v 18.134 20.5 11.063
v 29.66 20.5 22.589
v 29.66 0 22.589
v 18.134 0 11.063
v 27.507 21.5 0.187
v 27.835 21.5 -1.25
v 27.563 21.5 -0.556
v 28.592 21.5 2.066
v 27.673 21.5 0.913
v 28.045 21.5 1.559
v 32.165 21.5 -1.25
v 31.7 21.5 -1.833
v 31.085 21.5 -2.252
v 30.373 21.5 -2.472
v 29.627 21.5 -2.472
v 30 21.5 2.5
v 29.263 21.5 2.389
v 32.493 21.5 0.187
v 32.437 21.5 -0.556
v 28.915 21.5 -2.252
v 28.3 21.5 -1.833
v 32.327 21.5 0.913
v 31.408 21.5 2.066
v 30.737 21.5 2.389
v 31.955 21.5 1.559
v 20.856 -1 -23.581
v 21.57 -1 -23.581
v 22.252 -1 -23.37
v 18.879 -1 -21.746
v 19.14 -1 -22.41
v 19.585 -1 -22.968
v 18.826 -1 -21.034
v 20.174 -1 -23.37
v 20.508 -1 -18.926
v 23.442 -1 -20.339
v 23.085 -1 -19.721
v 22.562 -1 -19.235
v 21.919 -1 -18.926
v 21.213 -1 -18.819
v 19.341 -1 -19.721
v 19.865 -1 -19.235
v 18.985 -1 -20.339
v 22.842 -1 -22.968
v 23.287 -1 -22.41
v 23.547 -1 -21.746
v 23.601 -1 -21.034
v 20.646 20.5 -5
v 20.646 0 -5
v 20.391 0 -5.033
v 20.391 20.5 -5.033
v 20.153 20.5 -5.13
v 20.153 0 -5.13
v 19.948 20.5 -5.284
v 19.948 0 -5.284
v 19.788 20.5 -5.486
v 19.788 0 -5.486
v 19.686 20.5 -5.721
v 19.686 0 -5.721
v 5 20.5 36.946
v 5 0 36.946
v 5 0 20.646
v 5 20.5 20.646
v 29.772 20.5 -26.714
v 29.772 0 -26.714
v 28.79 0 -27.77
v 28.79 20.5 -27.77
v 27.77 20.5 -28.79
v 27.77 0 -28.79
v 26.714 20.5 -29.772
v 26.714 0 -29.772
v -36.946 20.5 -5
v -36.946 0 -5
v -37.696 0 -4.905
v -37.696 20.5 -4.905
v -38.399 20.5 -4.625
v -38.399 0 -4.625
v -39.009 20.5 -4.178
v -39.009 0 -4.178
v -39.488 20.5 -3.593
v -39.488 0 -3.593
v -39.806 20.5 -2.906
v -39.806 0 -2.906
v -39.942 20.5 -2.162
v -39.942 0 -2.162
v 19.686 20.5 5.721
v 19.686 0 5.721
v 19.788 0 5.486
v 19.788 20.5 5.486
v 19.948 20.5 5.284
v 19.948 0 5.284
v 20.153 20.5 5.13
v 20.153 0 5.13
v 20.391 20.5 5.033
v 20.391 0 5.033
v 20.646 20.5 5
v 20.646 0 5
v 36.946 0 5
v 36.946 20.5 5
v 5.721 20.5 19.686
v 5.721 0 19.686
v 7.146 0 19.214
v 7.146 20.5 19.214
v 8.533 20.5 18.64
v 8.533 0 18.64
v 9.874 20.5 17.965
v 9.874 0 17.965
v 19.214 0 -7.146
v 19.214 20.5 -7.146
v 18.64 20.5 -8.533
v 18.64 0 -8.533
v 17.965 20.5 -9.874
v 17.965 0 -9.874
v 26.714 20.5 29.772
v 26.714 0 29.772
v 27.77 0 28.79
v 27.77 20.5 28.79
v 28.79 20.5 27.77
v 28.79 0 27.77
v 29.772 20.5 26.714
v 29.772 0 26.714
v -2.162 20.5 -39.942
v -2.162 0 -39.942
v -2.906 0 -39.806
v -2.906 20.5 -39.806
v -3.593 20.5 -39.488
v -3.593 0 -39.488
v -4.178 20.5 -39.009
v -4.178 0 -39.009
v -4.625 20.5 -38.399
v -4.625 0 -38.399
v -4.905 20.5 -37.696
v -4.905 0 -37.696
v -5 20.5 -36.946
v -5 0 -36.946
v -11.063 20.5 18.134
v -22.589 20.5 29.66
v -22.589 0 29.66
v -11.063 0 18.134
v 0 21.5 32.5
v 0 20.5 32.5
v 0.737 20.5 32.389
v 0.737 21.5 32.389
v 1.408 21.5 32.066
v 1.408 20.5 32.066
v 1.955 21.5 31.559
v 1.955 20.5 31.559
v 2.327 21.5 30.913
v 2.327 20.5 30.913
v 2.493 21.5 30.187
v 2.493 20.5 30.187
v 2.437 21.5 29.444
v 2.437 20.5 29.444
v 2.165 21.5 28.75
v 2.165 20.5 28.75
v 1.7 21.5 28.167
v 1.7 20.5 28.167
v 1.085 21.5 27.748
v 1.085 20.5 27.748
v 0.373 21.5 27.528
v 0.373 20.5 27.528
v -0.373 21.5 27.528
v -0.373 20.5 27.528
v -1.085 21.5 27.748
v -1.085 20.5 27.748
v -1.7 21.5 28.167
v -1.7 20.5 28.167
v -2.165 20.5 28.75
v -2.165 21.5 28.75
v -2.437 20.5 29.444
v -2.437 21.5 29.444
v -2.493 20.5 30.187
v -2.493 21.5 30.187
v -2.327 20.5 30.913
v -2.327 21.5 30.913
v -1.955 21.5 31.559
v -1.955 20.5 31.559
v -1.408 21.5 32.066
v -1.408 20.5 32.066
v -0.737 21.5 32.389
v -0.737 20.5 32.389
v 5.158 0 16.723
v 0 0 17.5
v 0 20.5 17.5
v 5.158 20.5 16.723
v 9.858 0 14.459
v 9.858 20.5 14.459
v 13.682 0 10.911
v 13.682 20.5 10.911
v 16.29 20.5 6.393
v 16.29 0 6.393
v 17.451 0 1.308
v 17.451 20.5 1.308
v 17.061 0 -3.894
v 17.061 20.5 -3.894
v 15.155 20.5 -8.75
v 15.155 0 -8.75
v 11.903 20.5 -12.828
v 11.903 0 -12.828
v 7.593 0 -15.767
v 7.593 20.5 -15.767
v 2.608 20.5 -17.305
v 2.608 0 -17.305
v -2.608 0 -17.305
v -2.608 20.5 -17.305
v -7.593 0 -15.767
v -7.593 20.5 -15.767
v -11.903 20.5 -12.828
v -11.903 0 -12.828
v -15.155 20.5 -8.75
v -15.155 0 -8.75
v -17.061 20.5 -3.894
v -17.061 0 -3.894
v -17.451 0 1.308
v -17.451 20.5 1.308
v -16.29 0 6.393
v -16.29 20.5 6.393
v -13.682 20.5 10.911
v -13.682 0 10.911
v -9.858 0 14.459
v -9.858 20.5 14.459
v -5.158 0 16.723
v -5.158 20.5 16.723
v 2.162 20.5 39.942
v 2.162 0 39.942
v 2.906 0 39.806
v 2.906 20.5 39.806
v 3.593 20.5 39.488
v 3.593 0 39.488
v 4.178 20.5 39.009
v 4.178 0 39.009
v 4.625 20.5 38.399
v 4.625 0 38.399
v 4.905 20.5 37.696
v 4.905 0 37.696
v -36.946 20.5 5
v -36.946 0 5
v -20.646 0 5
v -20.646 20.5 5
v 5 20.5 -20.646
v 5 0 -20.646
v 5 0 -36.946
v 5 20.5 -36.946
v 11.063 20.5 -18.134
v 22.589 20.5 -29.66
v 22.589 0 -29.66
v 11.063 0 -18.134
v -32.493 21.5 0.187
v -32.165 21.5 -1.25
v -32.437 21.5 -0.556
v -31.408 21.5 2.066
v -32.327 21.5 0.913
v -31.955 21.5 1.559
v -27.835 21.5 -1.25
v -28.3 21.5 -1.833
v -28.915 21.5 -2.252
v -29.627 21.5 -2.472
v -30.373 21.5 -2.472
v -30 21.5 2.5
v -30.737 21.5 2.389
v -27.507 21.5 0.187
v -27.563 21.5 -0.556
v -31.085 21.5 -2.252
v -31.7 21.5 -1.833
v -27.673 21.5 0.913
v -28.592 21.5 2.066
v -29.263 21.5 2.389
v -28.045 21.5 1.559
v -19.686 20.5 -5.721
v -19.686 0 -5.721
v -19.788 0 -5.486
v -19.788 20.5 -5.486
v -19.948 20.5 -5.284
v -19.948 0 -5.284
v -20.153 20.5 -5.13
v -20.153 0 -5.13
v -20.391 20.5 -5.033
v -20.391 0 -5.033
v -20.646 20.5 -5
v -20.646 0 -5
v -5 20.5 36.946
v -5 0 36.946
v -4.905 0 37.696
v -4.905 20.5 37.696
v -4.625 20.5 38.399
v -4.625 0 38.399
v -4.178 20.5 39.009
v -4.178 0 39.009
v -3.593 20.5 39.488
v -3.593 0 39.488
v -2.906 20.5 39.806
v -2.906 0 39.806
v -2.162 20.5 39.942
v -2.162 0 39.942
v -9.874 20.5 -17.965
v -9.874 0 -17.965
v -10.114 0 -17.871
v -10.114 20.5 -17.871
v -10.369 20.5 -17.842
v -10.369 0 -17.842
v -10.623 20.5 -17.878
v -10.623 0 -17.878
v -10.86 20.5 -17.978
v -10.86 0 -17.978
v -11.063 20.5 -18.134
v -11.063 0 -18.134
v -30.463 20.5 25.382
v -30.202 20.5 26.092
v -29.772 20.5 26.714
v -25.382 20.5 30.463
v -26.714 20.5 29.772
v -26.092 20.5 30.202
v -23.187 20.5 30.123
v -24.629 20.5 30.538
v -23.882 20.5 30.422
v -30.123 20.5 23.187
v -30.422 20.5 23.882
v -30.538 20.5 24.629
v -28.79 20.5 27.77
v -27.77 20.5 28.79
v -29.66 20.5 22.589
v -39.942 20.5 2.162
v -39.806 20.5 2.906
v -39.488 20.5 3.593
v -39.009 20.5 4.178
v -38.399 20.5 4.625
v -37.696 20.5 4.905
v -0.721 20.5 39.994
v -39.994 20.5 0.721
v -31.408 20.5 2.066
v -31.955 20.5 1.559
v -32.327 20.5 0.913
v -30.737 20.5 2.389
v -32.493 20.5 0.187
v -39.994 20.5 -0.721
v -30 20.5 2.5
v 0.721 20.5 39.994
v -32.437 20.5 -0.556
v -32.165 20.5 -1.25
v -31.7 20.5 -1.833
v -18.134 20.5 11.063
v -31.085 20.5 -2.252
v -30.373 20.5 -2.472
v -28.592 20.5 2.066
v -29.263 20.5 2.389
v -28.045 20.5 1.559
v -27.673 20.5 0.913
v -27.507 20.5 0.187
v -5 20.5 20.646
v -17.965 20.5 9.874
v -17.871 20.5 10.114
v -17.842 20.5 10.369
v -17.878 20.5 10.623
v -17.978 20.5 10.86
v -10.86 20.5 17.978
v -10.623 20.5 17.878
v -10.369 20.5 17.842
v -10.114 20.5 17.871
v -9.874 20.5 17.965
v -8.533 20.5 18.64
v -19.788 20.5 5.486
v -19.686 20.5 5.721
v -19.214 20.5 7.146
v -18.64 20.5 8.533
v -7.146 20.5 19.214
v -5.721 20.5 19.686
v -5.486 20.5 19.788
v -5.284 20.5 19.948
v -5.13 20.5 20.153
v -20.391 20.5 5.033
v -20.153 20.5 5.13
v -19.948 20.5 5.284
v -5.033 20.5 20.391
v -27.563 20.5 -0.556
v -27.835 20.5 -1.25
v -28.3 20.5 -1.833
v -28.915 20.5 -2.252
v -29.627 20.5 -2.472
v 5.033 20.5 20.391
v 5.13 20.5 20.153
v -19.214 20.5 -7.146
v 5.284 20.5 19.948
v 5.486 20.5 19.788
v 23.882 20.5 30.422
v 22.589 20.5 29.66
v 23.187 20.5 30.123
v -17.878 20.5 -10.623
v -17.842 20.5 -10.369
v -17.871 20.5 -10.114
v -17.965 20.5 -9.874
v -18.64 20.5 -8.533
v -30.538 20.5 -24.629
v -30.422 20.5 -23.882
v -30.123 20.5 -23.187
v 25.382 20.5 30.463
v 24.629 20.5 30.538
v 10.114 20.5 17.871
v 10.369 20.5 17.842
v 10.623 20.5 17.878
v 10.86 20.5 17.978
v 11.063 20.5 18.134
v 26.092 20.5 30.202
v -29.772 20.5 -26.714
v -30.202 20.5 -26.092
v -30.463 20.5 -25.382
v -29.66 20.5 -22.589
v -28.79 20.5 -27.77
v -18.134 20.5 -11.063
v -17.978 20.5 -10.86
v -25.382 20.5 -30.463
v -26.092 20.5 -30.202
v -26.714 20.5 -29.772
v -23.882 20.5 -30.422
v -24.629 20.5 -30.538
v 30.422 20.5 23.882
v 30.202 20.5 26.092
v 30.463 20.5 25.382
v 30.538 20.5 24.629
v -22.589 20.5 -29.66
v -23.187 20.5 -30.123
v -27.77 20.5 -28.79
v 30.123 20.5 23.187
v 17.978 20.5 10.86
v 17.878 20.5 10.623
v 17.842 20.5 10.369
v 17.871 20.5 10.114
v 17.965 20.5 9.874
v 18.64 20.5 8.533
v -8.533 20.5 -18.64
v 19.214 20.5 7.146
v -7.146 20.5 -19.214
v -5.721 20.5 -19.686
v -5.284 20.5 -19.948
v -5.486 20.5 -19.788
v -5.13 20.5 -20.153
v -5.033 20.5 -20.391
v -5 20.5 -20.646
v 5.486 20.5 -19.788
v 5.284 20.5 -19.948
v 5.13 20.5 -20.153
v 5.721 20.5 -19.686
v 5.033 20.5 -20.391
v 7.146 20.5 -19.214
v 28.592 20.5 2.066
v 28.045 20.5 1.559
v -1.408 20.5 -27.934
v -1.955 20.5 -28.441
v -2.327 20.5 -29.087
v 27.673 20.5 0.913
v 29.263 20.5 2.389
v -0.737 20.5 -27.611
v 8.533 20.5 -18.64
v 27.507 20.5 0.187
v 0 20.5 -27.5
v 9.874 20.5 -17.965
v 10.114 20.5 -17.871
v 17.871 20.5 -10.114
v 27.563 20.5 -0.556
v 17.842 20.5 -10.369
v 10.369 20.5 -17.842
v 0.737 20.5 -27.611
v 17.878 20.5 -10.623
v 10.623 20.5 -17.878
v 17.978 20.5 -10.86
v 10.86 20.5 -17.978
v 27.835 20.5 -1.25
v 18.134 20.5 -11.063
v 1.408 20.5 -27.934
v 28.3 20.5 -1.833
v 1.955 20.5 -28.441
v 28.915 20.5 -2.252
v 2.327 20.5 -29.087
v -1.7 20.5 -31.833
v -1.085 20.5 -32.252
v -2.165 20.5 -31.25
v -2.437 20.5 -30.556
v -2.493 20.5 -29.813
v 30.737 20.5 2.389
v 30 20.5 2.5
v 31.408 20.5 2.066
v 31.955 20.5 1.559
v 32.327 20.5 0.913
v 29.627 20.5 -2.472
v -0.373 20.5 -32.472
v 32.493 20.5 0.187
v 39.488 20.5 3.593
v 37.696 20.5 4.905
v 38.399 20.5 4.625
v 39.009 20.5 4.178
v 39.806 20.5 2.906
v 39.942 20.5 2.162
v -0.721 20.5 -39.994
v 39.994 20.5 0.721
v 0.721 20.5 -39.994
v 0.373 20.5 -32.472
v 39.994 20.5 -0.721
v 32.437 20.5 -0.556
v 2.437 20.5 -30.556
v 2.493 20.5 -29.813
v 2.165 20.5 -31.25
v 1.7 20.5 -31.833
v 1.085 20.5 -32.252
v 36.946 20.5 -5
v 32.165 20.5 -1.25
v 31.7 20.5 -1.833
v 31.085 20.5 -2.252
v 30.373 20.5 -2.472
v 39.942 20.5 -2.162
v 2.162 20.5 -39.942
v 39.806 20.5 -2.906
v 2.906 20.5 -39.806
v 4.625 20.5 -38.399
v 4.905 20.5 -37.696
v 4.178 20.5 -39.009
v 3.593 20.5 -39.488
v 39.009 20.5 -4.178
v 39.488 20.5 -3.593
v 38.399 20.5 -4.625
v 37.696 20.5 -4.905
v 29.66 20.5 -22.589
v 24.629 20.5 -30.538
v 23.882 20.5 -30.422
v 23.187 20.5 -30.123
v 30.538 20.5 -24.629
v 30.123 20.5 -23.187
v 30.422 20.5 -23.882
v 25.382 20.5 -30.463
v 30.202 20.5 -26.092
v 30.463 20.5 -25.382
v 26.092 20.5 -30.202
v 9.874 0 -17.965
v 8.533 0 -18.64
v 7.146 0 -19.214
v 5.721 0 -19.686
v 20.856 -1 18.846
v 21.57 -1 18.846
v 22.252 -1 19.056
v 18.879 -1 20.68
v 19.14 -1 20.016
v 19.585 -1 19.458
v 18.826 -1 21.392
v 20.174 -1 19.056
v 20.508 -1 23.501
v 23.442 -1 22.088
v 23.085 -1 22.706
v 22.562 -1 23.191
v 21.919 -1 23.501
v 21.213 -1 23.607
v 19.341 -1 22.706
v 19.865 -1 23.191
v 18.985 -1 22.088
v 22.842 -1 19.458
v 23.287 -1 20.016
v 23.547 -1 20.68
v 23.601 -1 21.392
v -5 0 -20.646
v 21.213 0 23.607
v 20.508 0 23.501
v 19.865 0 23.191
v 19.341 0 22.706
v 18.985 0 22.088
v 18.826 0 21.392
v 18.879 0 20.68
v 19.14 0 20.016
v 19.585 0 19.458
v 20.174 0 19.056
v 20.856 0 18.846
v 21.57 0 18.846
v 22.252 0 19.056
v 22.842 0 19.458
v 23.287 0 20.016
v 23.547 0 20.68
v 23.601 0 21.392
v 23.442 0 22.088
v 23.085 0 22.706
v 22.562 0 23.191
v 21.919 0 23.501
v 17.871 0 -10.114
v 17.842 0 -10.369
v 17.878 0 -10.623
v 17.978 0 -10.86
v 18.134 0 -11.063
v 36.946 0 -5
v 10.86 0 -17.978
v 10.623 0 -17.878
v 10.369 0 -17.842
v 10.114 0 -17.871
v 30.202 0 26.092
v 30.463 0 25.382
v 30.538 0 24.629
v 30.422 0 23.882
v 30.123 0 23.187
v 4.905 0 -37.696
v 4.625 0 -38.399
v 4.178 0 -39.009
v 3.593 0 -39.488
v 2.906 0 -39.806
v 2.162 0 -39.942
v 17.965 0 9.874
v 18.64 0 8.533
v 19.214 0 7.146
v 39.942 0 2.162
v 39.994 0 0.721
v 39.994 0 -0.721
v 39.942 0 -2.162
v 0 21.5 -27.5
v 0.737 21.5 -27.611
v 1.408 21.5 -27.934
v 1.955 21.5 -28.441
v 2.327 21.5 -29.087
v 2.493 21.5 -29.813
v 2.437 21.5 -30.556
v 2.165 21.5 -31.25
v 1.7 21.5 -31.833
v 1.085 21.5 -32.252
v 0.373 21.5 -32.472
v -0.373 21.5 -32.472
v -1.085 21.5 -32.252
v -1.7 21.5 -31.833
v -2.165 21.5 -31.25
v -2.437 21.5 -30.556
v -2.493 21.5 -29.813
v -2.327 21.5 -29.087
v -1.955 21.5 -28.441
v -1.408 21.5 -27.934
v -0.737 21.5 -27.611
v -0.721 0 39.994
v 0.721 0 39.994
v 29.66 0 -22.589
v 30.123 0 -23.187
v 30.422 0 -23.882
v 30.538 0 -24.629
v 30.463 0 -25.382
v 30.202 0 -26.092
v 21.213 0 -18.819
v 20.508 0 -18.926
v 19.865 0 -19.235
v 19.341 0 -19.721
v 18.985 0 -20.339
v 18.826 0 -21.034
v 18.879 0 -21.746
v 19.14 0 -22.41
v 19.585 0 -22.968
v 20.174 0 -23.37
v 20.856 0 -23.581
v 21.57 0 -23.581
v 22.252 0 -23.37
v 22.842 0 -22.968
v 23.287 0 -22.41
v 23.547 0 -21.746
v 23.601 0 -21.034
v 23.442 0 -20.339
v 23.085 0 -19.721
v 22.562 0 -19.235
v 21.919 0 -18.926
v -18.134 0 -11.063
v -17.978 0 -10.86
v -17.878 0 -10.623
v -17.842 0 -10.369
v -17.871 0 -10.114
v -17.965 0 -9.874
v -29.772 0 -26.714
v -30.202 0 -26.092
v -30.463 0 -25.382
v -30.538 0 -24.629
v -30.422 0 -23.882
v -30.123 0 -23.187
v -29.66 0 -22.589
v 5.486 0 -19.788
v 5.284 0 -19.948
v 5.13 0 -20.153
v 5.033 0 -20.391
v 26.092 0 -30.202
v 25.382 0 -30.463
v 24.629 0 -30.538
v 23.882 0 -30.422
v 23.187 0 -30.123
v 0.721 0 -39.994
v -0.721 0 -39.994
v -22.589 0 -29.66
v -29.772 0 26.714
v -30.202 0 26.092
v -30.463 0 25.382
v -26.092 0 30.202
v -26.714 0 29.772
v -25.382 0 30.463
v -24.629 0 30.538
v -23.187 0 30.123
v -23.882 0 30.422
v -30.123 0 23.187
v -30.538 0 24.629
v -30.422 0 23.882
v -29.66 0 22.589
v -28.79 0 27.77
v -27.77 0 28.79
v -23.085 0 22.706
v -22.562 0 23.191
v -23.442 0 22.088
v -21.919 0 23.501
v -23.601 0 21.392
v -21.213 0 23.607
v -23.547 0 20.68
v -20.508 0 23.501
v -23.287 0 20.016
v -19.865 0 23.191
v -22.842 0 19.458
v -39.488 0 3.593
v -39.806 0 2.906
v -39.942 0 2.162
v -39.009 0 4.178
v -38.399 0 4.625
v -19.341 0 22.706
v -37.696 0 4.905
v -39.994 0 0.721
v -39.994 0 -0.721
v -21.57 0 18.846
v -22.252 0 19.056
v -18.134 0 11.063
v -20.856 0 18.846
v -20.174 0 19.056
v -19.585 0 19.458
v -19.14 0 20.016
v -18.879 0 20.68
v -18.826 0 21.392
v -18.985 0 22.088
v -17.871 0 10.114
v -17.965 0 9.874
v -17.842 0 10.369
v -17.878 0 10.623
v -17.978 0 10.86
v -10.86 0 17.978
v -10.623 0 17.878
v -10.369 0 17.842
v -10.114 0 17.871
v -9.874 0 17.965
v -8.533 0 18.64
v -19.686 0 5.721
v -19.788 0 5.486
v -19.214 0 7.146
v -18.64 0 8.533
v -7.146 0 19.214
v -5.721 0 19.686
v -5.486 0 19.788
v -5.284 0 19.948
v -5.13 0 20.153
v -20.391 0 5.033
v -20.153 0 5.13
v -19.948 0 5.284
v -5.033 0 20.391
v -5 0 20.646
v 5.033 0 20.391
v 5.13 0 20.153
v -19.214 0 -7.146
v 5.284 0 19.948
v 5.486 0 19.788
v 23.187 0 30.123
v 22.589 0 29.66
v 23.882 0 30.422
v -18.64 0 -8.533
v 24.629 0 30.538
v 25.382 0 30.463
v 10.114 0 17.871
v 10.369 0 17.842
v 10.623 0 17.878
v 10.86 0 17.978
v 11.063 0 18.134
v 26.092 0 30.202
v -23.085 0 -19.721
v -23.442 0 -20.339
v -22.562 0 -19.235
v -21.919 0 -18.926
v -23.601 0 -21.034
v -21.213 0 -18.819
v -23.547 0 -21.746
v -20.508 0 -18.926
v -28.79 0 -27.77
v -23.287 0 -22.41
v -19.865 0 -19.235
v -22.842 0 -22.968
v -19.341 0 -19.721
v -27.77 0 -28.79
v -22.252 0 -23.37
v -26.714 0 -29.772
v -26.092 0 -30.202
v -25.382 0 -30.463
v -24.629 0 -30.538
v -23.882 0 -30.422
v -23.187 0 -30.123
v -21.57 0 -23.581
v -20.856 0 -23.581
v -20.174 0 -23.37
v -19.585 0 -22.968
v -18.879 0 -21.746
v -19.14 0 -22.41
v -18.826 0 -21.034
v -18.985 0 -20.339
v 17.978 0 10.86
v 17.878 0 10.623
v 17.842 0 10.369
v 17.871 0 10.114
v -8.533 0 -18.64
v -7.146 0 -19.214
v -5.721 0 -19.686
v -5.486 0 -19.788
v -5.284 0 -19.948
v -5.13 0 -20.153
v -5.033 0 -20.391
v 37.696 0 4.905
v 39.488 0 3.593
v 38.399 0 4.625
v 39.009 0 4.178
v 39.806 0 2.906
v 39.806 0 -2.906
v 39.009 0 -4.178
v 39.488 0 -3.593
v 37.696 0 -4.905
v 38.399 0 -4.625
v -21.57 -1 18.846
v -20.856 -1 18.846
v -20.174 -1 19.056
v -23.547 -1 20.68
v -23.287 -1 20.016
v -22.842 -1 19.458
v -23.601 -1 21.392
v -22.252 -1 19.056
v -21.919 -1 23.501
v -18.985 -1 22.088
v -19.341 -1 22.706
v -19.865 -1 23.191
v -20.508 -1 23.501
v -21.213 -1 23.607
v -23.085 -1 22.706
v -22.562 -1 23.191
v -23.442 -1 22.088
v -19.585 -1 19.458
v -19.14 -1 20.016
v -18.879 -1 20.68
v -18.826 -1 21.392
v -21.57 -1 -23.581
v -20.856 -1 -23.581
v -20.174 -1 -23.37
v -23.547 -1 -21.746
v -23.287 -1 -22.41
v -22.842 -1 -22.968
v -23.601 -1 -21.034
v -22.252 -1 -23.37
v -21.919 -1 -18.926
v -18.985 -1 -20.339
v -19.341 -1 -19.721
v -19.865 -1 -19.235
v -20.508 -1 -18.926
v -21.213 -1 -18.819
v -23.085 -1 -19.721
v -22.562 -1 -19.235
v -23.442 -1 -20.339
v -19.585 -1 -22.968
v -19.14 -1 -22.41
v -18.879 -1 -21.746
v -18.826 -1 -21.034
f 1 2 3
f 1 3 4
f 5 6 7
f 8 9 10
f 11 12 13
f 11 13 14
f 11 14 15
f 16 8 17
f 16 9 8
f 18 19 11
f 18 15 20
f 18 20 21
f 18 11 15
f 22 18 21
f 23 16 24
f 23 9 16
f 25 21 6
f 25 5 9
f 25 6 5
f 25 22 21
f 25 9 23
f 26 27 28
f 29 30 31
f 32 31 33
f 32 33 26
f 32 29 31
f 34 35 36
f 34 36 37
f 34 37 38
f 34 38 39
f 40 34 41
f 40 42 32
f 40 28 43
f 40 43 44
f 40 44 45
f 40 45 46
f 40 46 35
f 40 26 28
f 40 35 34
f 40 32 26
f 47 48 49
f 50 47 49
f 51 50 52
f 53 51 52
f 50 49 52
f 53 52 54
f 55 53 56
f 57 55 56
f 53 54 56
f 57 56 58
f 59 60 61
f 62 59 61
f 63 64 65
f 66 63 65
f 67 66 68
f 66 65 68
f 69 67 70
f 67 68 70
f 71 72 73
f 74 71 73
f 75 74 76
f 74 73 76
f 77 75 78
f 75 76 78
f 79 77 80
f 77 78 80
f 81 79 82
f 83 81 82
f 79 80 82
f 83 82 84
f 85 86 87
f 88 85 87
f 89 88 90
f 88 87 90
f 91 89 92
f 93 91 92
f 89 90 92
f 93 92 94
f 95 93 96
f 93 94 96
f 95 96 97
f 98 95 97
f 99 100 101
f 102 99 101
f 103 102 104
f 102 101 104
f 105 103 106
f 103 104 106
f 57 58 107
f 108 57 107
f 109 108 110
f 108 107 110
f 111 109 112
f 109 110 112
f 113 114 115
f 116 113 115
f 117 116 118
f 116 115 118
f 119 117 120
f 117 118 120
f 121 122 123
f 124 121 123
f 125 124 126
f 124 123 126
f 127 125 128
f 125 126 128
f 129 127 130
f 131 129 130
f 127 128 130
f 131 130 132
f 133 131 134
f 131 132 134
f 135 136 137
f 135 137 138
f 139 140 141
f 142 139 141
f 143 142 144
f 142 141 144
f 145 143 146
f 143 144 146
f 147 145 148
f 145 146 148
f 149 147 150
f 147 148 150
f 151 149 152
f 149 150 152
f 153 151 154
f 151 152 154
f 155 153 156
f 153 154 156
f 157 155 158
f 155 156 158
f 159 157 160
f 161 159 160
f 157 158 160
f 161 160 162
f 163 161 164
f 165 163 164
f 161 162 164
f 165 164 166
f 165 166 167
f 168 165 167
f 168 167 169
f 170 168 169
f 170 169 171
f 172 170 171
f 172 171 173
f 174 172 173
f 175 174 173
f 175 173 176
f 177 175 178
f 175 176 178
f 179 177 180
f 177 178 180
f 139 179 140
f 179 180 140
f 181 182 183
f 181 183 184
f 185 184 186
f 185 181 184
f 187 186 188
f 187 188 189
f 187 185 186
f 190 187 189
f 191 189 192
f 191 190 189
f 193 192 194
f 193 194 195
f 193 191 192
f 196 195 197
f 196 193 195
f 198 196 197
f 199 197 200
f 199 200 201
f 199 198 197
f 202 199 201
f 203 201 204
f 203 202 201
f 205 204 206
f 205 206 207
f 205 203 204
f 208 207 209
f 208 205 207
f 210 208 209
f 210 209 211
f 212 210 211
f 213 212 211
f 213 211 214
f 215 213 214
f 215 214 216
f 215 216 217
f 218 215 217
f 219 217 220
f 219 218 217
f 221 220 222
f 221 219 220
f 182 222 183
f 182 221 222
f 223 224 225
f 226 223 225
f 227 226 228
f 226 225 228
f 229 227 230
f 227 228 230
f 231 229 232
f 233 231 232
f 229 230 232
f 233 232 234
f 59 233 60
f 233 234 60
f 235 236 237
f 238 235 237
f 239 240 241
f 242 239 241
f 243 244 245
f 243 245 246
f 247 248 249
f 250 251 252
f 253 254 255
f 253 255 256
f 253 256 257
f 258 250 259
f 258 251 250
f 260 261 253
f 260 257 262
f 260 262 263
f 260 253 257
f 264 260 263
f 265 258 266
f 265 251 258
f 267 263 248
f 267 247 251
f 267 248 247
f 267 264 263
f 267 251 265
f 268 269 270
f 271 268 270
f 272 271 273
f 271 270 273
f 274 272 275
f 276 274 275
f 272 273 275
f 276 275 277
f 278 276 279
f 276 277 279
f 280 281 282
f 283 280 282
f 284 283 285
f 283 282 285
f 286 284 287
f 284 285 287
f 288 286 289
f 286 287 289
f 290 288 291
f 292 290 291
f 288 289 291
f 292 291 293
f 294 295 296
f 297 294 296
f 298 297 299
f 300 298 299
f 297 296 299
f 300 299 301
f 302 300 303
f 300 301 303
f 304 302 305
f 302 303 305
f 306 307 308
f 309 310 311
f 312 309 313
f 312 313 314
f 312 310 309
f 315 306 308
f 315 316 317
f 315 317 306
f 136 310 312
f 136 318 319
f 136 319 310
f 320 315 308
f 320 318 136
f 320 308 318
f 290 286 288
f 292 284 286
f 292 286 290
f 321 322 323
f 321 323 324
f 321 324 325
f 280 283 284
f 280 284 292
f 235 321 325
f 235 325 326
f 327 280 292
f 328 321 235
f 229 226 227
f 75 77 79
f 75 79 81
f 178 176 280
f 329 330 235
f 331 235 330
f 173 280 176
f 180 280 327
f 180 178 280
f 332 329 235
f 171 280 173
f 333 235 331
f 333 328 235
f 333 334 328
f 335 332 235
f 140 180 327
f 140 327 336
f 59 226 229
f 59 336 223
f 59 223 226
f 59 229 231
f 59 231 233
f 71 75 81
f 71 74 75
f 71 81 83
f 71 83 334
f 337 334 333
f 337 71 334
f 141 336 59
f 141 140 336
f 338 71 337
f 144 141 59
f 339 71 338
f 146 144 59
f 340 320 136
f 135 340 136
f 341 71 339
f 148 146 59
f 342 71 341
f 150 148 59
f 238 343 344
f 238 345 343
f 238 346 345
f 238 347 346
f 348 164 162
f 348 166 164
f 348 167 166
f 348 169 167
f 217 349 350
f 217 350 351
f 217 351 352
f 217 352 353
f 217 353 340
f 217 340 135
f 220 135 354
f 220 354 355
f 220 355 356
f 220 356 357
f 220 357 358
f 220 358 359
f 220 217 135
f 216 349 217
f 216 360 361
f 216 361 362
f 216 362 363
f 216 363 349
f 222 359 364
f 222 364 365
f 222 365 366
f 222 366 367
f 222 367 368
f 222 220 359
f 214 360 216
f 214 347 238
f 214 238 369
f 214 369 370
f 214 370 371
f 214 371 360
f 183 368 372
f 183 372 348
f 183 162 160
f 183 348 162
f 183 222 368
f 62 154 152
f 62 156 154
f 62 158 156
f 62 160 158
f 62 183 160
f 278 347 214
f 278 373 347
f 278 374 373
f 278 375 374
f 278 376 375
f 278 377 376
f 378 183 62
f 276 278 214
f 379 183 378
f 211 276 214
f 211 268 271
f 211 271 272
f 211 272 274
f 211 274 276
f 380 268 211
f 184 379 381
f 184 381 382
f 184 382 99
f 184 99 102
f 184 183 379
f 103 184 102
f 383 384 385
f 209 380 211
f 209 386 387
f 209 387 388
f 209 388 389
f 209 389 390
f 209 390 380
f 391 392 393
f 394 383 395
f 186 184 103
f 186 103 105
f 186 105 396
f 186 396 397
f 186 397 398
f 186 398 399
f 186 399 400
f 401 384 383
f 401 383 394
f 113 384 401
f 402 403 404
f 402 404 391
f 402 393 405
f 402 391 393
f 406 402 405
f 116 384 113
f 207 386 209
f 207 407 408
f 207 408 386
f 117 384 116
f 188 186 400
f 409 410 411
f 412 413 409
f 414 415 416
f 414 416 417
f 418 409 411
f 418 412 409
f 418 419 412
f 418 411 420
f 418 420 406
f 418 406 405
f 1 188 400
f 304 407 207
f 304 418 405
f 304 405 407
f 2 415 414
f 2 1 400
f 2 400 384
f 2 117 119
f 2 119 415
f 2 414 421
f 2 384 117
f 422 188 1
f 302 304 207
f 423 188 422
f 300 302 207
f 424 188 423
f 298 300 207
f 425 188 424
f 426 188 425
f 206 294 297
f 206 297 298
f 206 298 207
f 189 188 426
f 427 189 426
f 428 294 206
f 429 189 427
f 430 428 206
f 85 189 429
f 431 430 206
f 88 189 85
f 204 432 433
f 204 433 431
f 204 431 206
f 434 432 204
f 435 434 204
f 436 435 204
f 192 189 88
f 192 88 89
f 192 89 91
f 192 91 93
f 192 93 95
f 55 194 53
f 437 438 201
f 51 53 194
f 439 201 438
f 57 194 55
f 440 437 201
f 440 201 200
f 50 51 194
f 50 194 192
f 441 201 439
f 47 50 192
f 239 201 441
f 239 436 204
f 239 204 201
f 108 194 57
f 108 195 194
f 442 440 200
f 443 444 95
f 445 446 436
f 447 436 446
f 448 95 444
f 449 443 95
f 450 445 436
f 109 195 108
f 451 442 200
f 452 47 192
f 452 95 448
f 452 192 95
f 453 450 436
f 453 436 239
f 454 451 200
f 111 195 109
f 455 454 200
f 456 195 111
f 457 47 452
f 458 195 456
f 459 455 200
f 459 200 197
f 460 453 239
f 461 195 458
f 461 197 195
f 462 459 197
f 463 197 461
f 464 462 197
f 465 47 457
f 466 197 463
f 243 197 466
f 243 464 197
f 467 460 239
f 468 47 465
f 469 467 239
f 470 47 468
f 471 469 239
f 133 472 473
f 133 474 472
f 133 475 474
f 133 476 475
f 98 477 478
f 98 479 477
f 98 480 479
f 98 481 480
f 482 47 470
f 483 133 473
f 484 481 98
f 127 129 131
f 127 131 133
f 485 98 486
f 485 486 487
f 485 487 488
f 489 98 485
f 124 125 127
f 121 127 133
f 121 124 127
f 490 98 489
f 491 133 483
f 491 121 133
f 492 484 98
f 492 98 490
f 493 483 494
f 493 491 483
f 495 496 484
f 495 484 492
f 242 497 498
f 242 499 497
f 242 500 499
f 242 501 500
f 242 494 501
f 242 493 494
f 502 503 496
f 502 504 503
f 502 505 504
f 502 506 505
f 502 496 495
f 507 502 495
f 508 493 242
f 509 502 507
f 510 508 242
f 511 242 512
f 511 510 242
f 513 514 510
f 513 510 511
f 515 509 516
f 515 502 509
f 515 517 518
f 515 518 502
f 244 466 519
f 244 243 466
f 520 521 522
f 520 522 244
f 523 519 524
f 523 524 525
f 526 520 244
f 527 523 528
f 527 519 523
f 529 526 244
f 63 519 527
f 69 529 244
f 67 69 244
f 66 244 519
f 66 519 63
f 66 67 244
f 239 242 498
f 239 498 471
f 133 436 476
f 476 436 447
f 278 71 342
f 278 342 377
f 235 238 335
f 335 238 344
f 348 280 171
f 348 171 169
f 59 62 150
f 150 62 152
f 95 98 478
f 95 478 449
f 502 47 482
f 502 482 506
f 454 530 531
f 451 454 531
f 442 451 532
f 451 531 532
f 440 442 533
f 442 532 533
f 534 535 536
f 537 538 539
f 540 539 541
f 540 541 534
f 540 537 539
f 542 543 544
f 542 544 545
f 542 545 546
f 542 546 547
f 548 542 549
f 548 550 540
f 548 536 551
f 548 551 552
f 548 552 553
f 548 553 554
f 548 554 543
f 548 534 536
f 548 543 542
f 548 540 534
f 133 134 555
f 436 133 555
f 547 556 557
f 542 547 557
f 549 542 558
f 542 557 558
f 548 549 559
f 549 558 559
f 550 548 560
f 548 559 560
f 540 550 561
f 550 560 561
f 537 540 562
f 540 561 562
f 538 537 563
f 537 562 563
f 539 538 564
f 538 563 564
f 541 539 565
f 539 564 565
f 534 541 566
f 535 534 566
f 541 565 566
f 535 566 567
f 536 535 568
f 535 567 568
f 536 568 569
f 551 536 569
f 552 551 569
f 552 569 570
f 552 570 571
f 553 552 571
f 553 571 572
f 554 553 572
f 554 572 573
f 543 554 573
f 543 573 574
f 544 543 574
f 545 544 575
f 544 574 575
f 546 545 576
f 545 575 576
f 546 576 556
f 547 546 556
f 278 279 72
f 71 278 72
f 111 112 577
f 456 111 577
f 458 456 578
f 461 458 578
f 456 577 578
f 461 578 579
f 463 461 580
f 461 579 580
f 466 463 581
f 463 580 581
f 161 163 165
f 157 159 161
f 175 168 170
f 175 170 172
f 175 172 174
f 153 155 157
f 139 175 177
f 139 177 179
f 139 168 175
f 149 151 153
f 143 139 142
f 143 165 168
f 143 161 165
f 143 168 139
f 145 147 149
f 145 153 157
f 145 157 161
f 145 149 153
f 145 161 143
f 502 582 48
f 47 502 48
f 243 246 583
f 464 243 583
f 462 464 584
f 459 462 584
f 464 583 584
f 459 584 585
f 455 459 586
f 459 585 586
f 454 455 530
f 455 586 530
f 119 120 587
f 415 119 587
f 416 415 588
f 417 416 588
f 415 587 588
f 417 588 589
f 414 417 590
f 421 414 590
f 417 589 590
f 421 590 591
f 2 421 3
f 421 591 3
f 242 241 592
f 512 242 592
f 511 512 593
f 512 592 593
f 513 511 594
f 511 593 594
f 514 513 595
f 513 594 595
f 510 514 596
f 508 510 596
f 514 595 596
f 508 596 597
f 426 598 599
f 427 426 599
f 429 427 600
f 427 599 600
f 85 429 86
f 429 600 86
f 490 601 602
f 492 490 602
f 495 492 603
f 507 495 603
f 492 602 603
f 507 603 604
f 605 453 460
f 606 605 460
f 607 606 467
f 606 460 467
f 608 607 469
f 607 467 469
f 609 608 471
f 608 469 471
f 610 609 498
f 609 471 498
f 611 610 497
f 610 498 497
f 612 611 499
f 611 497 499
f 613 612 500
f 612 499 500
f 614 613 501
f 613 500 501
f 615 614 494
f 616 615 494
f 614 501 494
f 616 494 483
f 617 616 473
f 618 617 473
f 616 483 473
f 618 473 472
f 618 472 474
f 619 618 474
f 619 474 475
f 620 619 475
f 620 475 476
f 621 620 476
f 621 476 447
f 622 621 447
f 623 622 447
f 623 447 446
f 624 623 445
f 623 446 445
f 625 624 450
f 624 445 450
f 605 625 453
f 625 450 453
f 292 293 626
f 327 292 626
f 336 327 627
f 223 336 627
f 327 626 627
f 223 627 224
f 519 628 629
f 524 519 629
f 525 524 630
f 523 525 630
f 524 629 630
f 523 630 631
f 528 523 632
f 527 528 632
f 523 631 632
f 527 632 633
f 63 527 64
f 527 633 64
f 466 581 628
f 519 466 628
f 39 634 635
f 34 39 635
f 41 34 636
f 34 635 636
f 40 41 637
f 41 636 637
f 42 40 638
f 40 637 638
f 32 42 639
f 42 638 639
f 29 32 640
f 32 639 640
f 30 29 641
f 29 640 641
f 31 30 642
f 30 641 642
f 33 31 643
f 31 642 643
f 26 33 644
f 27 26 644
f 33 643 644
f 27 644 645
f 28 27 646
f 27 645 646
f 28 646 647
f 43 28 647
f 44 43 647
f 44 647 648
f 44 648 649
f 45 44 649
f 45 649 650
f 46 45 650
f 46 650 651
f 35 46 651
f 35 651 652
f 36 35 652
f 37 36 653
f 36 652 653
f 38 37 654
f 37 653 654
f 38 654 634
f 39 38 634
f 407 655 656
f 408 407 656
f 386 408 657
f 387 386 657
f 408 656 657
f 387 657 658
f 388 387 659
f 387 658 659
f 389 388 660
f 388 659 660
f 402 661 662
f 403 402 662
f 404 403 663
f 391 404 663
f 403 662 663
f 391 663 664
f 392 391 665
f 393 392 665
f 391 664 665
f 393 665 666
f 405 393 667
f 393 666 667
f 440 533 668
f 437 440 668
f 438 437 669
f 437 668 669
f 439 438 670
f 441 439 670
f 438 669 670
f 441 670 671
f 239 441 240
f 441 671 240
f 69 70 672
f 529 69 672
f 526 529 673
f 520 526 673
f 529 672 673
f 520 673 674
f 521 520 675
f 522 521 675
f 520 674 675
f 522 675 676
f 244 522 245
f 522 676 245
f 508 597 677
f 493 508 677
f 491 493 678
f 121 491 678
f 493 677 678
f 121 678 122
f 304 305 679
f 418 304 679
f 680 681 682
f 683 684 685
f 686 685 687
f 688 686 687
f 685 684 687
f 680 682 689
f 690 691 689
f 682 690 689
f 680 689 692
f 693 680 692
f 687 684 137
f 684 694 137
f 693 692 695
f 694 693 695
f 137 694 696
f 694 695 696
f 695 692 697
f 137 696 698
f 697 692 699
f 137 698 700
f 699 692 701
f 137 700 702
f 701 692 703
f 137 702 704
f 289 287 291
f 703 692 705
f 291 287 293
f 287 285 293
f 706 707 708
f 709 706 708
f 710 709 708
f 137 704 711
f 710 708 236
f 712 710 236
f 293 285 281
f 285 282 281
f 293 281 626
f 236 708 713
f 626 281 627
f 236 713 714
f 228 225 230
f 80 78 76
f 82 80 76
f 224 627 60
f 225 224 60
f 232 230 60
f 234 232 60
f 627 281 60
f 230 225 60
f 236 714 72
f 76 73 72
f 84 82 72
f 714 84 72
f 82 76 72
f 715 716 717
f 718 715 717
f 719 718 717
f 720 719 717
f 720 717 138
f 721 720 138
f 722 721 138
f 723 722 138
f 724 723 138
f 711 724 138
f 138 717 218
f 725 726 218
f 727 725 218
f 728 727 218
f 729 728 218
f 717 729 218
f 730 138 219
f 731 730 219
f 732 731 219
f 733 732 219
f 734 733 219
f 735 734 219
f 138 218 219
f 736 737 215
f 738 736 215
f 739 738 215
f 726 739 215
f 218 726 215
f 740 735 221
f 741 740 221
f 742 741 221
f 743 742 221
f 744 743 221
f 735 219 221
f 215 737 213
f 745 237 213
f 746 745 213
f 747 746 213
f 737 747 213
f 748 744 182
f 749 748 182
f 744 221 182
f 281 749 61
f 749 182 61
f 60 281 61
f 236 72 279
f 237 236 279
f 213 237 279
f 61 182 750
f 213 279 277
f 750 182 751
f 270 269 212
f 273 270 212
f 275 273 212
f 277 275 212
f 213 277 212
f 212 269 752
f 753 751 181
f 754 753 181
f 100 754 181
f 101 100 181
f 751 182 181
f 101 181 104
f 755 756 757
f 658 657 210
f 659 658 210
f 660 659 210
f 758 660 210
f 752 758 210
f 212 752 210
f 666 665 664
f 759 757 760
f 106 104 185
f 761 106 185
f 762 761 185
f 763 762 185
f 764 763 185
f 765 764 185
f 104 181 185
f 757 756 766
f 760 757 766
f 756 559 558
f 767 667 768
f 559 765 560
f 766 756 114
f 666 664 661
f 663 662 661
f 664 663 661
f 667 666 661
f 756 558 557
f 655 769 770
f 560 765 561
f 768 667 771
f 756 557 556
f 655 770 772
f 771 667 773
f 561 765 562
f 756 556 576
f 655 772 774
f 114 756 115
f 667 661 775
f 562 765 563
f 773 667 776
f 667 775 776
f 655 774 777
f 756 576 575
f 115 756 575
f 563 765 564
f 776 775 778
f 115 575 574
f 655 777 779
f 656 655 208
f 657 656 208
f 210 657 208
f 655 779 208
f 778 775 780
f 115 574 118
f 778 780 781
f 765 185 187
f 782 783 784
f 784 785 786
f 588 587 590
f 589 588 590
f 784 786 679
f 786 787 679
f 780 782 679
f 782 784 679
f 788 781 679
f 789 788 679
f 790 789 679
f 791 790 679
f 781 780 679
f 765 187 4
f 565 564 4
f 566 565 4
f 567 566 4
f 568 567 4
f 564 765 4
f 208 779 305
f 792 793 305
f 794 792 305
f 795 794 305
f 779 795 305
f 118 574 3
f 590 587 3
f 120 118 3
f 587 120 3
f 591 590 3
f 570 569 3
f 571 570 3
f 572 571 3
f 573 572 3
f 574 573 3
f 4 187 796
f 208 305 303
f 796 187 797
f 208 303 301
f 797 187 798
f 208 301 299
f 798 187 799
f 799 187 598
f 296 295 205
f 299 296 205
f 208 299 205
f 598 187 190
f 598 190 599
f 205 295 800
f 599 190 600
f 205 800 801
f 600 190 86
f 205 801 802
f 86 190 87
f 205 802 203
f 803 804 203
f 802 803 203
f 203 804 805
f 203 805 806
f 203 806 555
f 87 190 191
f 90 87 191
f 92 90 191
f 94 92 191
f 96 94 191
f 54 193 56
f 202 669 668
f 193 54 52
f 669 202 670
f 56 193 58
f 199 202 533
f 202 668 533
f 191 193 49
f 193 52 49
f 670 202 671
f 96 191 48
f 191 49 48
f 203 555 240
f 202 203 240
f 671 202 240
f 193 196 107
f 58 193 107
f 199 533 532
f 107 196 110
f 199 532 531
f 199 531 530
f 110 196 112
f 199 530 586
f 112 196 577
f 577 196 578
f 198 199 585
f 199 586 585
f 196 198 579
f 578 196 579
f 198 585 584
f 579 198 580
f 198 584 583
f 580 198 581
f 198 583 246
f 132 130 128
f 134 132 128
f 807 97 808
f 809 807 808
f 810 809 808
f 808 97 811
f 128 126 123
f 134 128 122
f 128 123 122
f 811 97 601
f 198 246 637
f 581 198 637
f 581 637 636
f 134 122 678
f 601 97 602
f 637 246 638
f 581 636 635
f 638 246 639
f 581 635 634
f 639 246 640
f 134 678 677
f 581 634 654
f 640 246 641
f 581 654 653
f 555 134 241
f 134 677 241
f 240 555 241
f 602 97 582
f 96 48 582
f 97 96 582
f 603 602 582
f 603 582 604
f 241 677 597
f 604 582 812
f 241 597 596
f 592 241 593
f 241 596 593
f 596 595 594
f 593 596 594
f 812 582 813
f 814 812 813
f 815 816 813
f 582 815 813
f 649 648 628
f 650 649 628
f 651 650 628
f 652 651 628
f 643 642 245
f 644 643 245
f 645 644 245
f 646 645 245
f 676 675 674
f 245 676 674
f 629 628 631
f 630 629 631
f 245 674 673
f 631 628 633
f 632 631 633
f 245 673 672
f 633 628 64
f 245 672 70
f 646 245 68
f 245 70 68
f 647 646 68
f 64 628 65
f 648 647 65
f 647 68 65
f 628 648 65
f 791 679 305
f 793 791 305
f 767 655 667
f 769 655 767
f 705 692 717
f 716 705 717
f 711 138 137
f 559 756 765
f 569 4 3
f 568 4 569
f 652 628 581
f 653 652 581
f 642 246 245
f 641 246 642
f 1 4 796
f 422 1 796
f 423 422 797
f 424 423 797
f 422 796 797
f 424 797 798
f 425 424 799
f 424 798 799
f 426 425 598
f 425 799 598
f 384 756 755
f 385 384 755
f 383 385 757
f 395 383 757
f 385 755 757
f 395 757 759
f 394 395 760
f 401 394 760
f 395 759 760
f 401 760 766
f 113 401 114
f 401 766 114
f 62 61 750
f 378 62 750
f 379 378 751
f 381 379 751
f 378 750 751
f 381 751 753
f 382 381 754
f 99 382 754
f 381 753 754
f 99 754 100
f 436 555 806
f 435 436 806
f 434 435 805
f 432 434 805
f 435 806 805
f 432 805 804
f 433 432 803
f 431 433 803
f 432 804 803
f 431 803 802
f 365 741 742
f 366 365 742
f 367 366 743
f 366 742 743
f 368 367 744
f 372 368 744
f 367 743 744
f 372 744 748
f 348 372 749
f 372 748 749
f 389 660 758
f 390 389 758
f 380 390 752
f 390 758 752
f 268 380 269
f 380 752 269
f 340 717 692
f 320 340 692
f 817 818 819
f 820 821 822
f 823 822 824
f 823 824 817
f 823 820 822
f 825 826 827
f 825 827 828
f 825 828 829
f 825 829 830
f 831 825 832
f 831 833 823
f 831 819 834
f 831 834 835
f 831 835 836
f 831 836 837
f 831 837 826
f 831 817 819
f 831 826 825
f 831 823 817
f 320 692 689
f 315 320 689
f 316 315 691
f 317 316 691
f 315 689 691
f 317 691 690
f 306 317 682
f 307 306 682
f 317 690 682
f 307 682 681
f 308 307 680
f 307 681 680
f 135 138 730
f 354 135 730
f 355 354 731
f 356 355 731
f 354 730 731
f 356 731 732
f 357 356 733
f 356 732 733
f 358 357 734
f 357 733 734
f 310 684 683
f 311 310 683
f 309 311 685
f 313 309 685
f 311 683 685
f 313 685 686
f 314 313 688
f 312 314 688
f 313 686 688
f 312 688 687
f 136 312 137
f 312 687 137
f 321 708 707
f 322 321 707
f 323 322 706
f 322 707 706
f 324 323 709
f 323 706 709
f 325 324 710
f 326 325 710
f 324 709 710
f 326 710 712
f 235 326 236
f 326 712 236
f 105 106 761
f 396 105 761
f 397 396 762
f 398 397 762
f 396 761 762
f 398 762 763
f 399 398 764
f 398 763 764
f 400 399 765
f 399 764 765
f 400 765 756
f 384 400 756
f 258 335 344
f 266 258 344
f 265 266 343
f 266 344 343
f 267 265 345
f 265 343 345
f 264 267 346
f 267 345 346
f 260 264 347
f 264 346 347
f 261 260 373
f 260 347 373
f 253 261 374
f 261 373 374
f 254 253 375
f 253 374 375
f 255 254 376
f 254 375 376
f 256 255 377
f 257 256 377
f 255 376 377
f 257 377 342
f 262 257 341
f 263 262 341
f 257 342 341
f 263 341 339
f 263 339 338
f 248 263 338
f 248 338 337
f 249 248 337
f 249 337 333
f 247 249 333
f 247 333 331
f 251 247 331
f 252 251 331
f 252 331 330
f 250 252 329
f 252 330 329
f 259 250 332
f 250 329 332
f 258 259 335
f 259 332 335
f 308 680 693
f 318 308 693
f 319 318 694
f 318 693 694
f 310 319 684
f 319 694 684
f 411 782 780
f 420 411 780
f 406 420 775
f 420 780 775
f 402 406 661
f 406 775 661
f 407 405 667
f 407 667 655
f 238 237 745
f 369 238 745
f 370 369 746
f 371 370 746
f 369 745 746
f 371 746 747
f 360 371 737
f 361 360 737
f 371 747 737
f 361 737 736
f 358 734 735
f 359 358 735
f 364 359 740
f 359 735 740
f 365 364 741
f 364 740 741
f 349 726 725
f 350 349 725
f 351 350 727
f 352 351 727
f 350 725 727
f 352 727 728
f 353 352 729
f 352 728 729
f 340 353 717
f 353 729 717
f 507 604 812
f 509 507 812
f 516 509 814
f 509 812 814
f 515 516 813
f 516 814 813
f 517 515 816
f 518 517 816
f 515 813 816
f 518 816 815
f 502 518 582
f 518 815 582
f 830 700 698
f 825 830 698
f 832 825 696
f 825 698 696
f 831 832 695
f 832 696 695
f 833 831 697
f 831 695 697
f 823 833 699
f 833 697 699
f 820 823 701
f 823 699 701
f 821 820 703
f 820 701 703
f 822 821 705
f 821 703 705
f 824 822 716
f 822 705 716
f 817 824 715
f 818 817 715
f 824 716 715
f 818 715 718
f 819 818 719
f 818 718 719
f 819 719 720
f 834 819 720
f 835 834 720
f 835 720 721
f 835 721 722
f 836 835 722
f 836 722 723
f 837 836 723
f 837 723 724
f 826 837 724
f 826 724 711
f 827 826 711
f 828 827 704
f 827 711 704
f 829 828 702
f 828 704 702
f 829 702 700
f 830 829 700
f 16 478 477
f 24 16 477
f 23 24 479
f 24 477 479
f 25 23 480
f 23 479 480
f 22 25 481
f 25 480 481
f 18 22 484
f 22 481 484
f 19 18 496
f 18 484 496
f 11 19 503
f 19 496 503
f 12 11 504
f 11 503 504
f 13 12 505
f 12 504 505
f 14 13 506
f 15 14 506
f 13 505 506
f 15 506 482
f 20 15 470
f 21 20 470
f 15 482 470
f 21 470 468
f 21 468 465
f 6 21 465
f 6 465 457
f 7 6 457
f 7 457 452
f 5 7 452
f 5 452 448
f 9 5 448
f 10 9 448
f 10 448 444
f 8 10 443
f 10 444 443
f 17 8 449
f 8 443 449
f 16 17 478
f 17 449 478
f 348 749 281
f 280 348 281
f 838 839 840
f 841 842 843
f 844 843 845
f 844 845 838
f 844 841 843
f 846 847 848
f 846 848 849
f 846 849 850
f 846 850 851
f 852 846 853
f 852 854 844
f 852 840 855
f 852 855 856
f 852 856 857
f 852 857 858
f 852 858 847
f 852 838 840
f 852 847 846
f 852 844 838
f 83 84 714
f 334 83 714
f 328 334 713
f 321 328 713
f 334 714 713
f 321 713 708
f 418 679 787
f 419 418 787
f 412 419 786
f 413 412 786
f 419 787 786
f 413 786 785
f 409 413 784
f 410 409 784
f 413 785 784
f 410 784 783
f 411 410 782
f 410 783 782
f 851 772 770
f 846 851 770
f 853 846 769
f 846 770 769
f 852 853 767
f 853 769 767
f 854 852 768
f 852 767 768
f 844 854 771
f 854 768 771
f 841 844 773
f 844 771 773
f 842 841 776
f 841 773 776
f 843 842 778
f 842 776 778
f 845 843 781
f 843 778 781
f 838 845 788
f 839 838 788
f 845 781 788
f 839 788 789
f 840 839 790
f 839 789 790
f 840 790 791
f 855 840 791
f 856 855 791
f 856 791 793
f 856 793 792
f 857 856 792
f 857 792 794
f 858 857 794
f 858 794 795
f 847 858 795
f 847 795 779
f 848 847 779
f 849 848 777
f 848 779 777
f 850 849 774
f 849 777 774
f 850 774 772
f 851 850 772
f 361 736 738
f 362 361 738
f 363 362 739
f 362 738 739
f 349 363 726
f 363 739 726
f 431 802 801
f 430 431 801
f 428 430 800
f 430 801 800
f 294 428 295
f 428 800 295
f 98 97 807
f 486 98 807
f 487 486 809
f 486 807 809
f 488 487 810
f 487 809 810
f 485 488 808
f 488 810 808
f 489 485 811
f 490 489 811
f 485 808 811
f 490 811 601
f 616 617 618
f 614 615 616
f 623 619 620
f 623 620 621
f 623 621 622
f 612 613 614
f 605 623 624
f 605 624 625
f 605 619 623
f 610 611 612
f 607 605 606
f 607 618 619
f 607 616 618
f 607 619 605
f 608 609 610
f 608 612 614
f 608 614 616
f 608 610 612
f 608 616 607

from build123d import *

# Parameters (mm, degrees)
SKETCH1_R           = 17.5
BOSS_EXTRUDE1_DEPTH = 20.5
SKETCH2_R           = 2.5
BOSS_EXTRUDE2_DEPTH = 1
SKETCH3_R           = 2.394052793
BOSS_EXTRUDE3_DEPTH = 1


with BuildPart() as part:
    # Sketch1 → Boss-Extrude1 (new body)
    with BuildSketch(Plane(origin=(0, 0, 0), x_dir=(1, 0, 0), z_dir=(0, 1, 0))):
        with BuildLine():
            Line((5, 20.645822822), (5, 36.945906404))
            ThreePointArc((5, 36.945906404), (4.177898814, 39.00909732), (2.162162162, 39.941520437))
            ThreePointArc((2.162162162, 39.941520437), (0, 40), (-2.162162162, 39.941520437))
            ThreePointArc((-2.162162162, 39.941520437), (-4.177898814, 39.00909732), (-5, 36.945906404))
            Line((-5, 36.945906404), (-5, 20.645822822))
            ThreePointArc((-5, 20.645822822), (-5.200290751, 20.04543535), (-5.720930233, 19.685551993))
            ThreePointArc((-5.720930233, 19.685551993), (-7.845010363, 18.939530416), (-9.874478744, 17.965095868))
            ThreePointArc((-9.874478744, 17.965095868), (-10.497102414, 17.851424122), (-11.063267415, 18.134335227))
            Line((-11.063267415, 18.134335227), (-22.589167049, 29.660234861))
            ThreePointArc((-22.589167049, 29.660234861), (-24.629376661, 30.537817825), (-26.714040425, 29.771799478))
            ThreePointArc((-26.714040425, 29.771799478), (-28.284271247, 28.284271247), (-29.771799478, 26.714040425))
            ThreePointArc((-29.771799478, 26.714040425), (-30.537817825, 24.629376661), (-29.660234861, 22.589167049))
            Line((-29.660234861, 22.589167049), (-18.134335227, 11.063267415))
            ThreePointArc((-18.134335227, 11.063267415), (-17.851424122, 10.497102414), (-17.965095868, 9.874478744))
            ThreePointArc((-17.965095868, 9.874478744), (-18.939530416, 7.845010363), (-19.685551993, 5.720930233))
            ThreePointArc((-19.685551993, 5.720930233), (-20.04543535, 5.200290751), (-20.645822822, 5))
            Line((-20.645822822, 5), (-36.945906404, 5))
            ThreePointArc((-36.945906404, 5), (-39.00909732, 4.177898814), (-39.941520437, 2.162162162))
            ThreePointArc((-39.941520437, 2.162162162), (-40, 0), (-39.941520437, -2.162162162))
            ThreePointArc((-39.941520437, -2.162162162), (-39.00909732, -4.177898814), (-36.945906404, -5))
            Line((-36.945906404, -5), (-20.645822822, -5))
            ThreePointArc((-20.645822822, -5), (-20.04543535, -5.200290751), (-19.685551993, -5.720930233))
            ThreePointArc((-19.685551993, -5.720930233), (-18.939530416, -7.845010363), (-17.965095868, -9.874478744))
            ThreePointArc((-17.965095868, -9.874478744), (-17.851424122, -10.497102414), (-18.134335227, -11.063267415))
            Line((-18.134335227, -11.063267415), (-29.660234861, -22.589167049))
            ThreePointArc((-29.660234861, -22.589167049), (-30.537817825, -24.629376661), (-29.771799478, -26.714040425))
            ThreePointArc((-29.771799478, -26.714040425), (-28.284271247, -28.284271247), (-26.714040425, -29.771799478))
            ThreePointArc((-26.714040425, -29.771799478), (-24.629376661, -30.537817825), (-22.589167049, -29.660234861))
            Line((-22.589167049, -29.660234861), (-11.063267415, -18.134335227))
            ThreePointArc((-11.063267415, -18.134335227), (-10.497102414, -17.851424122), (-9.874478744, -17.965095868))
            ThreePointArc((-9.874478744, -17.965095868), (-7.845010363, -18.939530416), (-5.720930233, -19.685551993))
            ThreePointArc((-5.720930233, -19.685551993), (-5.200290751, -20.04543535), (-5, -20.645822822))
            Line((-5, -20.645822822), (-5, -36.945906404))
            ThreePointArc((-5, -36.945906404), (-4.177898814, -39.00909732), (-2.162162162, -39.941520437))
            ThreePointArc((-2.162162162, -39.941520437), (0, -40), (2.162162162, -39.941520437))
            ThreePointArc((2.162162162, -39.941520437), (4.177898814, -39.00909732), (5, -36.945906404))
            Line((5, -36.945906404), (5, -20.645822822))
            ThreePointArc((5, -20.645822822), (5.200290751, -20.04543535), (5.720930233, -19.685551993))
            ThreePointArc((5.720930233, -19.685551993), (7.845010363, -18.939530416), (9.874478744, -17.965095868))
            ThreePointArc((9.874478744, -17.965095868), (10.497102414, -17.851424122), (11.063267415, -18.134335227))
            Line((11.063267415, -18.134335227), (22.589167049, -29.660234861))
            ThreePointArc((22.589167049, -29.660234861), (24.629376661, -30.537817825), (26.714040425, -29.771799478))
            ThreePointArc((26.714040425, -29.771799478), (28.284271247, -28.284271247), (29.771799478, -26.714040425))
            ThreePointArc((29.771799478, -26.714040425), (30.537817825, -24.629376661), (29.660234861, -22.589167049))
            Line((29.660234861, -22.589167049), (18.134335227, -11.063267415))
            ThreePointArc((18.134335227, -11.063267415), (17.851424122, -10.497102414), (17.965095868, -9.874478744))
            ThreePointArc((17.965095868, -9.874478744), (18.939530416, -7.845010363), (19.685551993, -5.720930233))
            ThreePointArc((19.685551993, -5.720930233), (20.04543535, -5.200290751), (20.645822822, -5))
            Line((20.645822822, -5), (36.945906404, -5))
            ThreePointArc((36.945906404, -5), (39.00909732, -4.177898814), (39.941520437, -2.162162162))
            ThreePointArc((39.941520437, -2.162162162), (40, 0), (39.941520437, 2.162162162))
            ThreePointArc((39.941520437, 2.162162162), (39.00909732, 4.177898814), (36.945906404, 5))
            Line((36.945906404, 5), (20.645822822, 5))
            ThreePointArc((20.645822822, 5), (20.04543535, 5.200290751), (19.685551993, 5.720930233))
            ThreePointArc((19.685551993, 5.720930233), (18.939530416, 7.845010363), (17.965095868, 9.874478744))
            ThreePointArc((17.965095868, 9.874478744), (17.851424122, 10.497102414), (18.134335227, 11.063267415))
            Line((18.134335227, 11.063267415), (29.660234861, 22.589167049))
            ThreePointArc((29.660234861, 22.589167049), (30.537817825, 24.629376661), (29.771799478, 26.714040425))
            ThreePointArc((29.771799478, 26.714040425), (28.284271247, 28.284271247), (26.714040425, 29.771799478))
            ThreePointArc((26.714040425, 29.771799478), (24.629376661, 30.537817825), (22.589167049, 29.660234861))
            Line((22.589167049, 29.660234861), (11.063267415, 18.134335227))
            ThreePointArc((11.063267415, 18.134335227), (10.497102414, 17.851424122), (9.874478744, 17.965095868))
            ThreePointArc((9.874478744, 17.965095868), (7.845010363, 18.939530416), (5.720930233, 19.685551993))
            ThreePointArc((5.720930233, 19.685551993), (5.200290751, 20.04543535), (5, 20.645822822))
        make_face()
        with Locations(Location((0, 0, 0), (0, 0, 270))):
            Circle(SKETCH1_R, mode=Mode.SUBTRACT)
    extrude(amount=BOSS_EXTRUDE1_DEPTH)

    # Sketch2 → Boss-Extrude2 (add)
    with BuildSketch(Plane(origin=(0, 20.5, 0), x_dir=(1, 0, 0), z_dir=(0, 1, 0))):
        with Locations(Location((0, 30, 0), (0, 0, 270))):
            Circle(SKETCH2_R)
        with Locations(Location((30, 0, 0), (0, 0, 270))):
            Circle(SKETCH2_R)
        with Locations(Location((0, -30, 0), (0, 0, 270))):
            Circle(SKETCH2_R)
        with Locations(Location((-30, 0, 0), (0, 0, 270))):
            Circle(SKETCH2_R)
    extrude(amount=BOSS_EXTRUDE2_DEPTH)

    # Sketch3 → Boss-Extrude3 (add)
    with BuildSketch(Plane.XZ):
        with Locations(Location((-21.213203436, 21.213203436, 0), (0, 0, 90))):
            Circle(SKETCH3_R)
        with Locations(Location((21.213203436, 21.213203436, 0), (0, 0, 90))):
            Circle(SKETCH3_R)
        with Locations(Location((21.213203436, -21.213203436, 0), (0, 0, 90))):
            Circle(SKETCH3_R)
        with Locations(Location((-21.213203436, -21.213203436, 0), (0, 0, 90))):
            Circle(SKETCH3_R)
    extrude(amount=BOSS_EXTRUDE3_DEPTH)


solid = part.part
